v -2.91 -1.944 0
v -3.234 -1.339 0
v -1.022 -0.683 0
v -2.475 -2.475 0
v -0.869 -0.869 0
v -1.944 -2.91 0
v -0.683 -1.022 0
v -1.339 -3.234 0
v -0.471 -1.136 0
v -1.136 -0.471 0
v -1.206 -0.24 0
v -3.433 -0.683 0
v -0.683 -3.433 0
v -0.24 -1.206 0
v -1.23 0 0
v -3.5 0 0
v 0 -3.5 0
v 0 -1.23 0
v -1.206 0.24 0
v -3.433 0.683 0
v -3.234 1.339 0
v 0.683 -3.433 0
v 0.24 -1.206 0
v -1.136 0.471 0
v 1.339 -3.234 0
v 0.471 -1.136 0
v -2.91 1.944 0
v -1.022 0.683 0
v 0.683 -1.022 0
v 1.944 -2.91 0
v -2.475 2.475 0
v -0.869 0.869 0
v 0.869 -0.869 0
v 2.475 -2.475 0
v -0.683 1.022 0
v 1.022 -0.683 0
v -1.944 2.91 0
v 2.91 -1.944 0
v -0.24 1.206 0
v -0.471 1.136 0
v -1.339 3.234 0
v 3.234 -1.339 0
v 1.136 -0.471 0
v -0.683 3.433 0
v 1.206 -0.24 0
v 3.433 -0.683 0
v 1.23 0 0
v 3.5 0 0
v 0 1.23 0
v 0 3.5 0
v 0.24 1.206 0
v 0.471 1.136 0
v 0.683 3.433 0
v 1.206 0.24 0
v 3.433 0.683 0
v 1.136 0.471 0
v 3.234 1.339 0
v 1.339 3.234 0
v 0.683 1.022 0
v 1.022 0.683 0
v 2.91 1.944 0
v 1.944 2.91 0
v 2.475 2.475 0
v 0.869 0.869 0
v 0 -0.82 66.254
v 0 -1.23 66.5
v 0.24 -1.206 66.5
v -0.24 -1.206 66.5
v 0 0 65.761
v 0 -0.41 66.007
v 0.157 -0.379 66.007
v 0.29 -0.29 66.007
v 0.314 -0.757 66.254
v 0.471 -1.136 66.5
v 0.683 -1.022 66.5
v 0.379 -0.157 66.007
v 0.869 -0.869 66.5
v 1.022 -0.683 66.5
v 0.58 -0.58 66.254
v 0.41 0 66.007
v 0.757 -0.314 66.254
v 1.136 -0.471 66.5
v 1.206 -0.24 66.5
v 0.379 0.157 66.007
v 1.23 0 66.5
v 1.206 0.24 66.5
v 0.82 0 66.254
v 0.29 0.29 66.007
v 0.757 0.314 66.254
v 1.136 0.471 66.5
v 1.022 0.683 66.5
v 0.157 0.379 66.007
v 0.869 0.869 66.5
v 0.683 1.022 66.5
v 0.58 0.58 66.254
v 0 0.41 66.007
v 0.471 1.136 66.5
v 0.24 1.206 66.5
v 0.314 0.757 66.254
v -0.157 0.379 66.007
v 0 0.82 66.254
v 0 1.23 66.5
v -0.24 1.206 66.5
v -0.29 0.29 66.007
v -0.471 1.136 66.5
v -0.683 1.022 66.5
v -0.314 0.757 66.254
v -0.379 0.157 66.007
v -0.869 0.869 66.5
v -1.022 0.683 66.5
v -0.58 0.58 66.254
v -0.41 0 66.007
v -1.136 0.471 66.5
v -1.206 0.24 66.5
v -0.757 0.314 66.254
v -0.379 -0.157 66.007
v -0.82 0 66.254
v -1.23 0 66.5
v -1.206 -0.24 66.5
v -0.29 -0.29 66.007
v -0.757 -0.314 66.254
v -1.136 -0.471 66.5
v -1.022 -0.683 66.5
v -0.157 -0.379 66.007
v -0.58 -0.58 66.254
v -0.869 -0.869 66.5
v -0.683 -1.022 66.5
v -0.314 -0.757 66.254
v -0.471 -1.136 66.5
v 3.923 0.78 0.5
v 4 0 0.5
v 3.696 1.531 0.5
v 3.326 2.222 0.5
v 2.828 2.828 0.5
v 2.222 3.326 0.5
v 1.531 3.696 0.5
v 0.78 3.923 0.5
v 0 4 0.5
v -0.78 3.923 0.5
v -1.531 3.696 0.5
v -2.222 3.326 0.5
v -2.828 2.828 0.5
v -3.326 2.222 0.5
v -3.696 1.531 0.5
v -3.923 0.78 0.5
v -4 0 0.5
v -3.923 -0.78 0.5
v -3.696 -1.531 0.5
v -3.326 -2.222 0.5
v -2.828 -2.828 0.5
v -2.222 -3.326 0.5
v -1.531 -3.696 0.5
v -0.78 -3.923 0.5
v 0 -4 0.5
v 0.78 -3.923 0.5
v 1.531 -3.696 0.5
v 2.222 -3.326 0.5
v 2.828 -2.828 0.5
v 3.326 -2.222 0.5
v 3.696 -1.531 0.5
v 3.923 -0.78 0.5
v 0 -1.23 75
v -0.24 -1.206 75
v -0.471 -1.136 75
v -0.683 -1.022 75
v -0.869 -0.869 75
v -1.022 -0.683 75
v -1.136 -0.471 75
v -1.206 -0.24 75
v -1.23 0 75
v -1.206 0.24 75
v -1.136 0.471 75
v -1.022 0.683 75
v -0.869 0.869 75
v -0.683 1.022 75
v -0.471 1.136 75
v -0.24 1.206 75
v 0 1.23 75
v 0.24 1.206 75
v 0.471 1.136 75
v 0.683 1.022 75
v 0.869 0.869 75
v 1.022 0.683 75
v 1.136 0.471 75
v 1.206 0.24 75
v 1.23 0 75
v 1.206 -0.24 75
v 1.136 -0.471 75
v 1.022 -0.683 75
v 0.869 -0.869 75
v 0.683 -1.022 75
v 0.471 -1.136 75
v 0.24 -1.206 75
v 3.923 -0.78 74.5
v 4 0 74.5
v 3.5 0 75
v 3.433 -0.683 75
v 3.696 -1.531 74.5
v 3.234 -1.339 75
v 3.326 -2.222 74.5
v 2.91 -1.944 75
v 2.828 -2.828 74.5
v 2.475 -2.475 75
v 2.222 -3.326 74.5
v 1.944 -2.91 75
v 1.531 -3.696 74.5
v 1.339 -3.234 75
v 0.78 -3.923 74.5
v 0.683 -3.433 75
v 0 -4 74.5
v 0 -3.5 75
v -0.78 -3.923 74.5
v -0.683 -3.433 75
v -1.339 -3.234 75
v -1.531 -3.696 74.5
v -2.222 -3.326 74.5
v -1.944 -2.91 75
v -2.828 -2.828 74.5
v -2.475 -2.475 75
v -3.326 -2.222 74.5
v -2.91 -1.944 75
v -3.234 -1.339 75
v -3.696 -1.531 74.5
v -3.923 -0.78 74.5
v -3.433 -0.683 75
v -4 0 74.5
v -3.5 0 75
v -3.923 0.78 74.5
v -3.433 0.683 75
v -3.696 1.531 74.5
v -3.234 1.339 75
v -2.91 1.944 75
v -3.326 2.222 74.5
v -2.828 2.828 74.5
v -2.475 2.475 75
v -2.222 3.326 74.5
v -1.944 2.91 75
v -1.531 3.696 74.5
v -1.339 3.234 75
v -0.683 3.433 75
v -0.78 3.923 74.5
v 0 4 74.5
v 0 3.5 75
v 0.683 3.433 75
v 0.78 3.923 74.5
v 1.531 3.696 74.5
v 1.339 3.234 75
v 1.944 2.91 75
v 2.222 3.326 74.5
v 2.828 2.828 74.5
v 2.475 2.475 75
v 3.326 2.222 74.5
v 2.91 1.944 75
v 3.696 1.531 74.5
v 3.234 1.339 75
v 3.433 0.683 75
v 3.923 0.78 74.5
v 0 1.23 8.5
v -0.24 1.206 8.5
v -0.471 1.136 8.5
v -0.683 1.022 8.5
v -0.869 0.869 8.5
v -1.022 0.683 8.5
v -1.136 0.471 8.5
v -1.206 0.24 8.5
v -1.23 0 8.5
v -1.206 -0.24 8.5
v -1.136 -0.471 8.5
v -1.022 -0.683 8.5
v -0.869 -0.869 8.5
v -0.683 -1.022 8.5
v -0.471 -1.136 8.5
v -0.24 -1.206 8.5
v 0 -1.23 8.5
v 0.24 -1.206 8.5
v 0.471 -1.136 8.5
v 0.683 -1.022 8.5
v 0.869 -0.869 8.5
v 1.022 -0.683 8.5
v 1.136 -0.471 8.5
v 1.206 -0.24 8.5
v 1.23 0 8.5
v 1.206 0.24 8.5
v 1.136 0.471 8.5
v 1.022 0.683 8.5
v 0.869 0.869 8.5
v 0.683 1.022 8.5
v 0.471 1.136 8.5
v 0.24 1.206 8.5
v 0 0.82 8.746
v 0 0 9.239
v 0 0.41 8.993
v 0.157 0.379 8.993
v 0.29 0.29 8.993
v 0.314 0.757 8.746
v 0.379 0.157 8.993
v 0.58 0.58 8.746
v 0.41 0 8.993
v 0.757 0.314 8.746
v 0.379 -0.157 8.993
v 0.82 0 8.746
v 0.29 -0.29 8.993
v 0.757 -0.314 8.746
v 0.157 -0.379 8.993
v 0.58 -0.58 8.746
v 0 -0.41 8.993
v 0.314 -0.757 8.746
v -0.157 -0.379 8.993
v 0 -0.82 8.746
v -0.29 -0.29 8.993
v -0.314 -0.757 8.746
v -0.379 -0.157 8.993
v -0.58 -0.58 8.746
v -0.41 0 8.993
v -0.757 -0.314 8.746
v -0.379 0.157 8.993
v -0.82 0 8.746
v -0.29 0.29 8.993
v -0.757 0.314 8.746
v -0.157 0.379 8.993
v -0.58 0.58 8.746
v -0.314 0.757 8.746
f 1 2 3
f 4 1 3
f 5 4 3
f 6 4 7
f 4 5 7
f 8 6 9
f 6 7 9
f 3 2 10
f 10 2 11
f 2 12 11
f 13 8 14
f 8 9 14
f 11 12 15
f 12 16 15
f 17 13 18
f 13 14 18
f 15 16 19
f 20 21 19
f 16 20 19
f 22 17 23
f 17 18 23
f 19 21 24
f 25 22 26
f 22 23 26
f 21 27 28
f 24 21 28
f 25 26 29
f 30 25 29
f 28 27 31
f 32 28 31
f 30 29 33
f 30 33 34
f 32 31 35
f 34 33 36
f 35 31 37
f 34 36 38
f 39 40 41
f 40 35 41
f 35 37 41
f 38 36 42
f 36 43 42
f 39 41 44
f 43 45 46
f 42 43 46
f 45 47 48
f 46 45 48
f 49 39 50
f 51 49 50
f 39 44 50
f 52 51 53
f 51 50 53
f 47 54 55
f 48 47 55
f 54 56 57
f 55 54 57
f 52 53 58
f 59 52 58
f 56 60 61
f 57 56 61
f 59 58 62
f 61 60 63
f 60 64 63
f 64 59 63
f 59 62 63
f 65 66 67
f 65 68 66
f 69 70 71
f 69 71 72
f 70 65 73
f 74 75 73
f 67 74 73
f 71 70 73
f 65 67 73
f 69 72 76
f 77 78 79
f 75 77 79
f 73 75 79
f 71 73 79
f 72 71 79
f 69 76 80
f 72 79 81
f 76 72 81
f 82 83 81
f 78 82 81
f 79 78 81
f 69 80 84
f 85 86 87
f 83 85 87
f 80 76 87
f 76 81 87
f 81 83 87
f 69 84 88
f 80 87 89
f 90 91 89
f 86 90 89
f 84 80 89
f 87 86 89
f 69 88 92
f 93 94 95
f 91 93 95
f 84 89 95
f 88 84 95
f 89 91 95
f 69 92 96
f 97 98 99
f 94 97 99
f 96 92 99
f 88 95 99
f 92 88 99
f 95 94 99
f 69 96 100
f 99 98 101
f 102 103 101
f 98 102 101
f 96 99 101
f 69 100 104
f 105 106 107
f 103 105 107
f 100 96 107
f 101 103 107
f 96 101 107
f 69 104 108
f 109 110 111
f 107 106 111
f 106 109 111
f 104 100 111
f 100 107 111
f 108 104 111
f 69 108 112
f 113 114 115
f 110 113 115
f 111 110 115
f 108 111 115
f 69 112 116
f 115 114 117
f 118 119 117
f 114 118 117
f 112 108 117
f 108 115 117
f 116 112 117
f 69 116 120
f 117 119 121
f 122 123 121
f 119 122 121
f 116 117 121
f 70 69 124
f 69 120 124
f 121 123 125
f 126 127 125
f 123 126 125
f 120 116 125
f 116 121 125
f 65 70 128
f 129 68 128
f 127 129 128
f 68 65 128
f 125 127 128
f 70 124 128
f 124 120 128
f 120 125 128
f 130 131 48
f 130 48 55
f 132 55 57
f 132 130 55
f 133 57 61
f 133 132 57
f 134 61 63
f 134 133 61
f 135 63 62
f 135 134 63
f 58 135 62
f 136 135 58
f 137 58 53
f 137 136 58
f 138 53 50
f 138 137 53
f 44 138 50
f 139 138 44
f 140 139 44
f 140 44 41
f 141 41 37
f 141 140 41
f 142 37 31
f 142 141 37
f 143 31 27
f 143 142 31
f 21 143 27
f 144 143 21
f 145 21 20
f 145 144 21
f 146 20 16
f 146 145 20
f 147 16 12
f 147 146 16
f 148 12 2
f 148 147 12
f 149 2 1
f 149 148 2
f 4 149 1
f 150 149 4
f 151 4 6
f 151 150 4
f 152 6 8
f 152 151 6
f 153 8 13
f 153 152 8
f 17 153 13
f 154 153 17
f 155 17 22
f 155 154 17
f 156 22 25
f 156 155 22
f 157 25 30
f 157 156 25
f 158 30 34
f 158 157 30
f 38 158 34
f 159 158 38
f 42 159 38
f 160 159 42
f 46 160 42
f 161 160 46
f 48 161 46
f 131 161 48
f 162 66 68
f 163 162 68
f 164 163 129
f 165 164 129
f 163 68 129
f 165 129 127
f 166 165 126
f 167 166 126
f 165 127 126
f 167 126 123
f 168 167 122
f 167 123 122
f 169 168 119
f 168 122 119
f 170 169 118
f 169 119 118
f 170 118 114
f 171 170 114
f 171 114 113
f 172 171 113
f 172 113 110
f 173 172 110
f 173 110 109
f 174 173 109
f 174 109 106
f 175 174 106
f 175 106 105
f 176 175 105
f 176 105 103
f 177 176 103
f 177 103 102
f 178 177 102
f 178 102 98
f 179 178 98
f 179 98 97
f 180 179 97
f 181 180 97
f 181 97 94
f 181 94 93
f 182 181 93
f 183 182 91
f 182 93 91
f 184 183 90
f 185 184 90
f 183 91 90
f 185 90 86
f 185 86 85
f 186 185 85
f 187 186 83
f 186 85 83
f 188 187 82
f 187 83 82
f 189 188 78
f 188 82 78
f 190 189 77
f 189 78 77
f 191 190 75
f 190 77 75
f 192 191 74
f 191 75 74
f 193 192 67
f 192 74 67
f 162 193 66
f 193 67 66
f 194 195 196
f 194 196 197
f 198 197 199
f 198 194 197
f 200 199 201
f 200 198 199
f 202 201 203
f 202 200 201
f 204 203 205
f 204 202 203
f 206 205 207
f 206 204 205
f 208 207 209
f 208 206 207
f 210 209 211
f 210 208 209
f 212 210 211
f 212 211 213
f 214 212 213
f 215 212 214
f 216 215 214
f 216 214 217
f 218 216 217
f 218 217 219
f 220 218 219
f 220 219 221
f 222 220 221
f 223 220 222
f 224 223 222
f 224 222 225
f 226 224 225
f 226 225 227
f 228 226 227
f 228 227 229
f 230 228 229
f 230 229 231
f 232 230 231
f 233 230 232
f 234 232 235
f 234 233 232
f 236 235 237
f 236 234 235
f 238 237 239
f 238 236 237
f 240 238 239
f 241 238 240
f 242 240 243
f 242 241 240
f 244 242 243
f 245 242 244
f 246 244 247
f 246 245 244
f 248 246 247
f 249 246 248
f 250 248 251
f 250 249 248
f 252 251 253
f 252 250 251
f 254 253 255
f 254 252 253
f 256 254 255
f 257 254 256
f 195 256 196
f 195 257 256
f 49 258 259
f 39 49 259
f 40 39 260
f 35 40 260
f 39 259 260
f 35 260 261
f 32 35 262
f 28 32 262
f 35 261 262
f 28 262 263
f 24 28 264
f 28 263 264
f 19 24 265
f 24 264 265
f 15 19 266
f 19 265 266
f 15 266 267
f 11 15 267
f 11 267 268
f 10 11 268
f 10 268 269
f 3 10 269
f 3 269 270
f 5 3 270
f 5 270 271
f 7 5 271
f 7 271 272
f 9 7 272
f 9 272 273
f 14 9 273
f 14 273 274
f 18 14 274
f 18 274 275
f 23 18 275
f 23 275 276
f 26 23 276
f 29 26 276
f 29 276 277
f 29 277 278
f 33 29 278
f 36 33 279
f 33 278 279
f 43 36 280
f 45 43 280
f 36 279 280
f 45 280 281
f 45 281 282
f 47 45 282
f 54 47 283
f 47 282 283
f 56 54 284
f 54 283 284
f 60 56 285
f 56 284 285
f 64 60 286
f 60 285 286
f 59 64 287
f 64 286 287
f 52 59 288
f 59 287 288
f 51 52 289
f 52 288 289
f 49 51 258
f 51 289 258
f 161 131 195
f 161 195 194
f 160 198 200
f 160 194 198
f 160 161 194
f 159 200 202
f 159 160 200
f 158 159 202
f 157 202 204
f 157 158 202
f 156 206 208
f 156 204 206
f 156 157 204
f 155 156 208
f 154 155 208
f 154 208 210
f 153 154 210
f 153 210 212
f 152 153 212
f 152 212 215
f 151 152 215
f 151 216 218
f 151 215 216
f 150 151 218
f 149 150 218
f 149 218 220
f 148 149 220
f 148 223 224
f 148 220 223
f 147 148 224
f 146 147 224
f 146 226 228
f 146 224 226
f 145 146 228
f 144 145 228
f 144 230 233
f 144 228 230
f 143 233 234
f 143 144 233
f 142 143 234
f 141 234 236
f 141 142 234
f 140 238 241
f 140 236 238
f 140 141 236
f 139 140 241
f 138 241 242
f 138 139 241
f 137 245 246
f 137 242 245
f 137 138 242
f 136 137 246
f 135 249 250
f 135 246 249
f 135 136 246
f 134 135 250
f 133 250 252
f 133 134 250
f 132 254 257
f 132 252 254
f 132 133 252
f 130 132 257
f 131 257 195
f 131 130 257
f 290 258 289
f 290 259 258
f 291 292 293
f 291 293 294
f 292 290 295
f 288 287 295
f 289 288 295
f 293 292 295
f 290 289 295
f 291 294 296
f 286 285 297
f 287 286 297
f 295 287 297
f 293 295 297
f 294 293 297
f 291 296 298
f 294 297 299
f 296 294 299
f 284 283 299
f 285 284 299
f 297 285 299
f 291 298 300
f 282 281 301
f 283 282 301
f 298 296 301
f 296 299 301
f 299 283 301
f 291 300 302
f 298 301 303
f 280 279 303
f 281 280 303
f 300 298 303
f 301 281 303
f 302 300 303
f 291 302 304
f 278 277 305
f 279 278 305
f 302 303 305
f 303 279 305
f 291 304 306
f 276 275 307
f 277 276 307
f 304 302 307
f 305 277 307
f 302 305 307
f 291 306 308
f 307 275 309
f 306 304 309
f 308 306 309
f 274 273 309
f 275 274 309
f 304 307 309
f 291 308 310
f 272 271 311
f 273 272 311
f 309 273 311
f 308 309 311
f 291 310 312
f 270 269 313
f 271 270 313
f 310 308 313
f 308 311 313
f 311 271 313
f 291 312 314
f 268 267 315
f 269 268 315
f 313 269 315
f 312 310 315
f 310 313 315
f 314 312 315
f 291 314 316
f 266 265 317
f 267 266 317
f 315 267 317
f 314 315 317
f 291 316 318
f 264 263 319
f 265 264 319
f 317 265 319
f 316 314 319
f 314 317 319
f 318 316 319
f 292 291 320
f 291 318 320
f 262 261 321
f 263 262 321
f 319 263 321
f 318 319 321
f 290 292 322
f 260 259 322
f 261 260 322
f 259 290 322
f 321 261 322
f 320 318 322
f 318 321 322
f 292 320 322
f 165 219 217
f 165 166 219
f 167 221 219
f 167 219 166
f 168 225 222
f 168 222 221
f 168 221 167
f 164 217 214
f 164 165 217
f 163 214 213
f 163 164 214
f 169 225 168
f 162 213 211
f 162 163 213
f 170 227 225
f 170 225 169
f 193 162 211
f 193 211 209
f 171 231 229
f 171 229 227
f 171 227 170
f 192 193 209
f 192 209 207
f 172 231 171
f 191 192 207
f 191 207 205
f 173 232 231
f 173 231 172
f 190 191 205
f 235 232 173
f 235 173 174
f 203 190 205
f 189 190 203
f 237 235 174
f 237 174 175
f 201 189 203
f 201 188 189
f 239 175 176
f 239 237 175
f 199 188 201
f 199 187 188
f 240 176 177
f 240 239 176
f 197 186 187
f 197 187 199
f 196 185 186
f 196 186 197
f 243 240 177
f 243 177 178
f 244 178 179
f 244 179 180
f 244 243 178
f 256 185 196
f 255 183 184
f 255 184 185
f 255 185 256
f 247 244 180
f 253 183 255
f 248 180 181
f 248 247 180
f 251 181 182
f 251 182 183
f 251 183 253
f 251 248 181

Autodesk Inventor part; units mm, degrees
ref_plane "Plan YZ" through (0, 0, 0) normal (1, 0, 0) x (0, 1, 0)
ref_plane "Plan XZ" through (0, 0, 0) normal (0, 1, 0) x (-1, 0, 0)
ref_plane "Plan XY" through (0, 0, 0) normal (0, 0, 1) x (1, 0, 0)
sketch "Esquisse1" plane through (0, 0, 0) normal (0, 0, 1) x (1, 0, 0)
  circle A0 centre (0, 0) radius 4
  dimension "d0" = 8
extrude "Extrusion1" add sketch "Esquisse1" along normal blind 75
sketch "Esquisse6" plane through (0, 0, 75) normal (0, 0, 1) x (1, 0, 0)
  point P0 (0, 0)
  point P1 (0, 0)
hole "Perçage1" at (0, 0, 75) direction (0, 0, -1) diameter 2.459 depth 8.5 tip angle 118 thread size "M3x0.5" class "6H" standard "ISO M"
sketch "Esquisse7" plane through (0, 0, 0) normal (0, 0, -1) x (-1, 0, 0)
  circle A0 centre (0, 0) radius 1.2295 projected
hole "Perçage2" at (0, 0, 0) direction (0, 0, 1) diameter 2.459 depth 8.5 tip angle 118 thread size "M3x0.5" class "6H" standard "ISO M"
chamfer "Chanfrein1" distance 0.5 angle 45 2 edges at (-4, 0, 0) (-4, 0, 75)
properties part number "P1704_001" material ".EN AW-6082/AlMgSi1"
